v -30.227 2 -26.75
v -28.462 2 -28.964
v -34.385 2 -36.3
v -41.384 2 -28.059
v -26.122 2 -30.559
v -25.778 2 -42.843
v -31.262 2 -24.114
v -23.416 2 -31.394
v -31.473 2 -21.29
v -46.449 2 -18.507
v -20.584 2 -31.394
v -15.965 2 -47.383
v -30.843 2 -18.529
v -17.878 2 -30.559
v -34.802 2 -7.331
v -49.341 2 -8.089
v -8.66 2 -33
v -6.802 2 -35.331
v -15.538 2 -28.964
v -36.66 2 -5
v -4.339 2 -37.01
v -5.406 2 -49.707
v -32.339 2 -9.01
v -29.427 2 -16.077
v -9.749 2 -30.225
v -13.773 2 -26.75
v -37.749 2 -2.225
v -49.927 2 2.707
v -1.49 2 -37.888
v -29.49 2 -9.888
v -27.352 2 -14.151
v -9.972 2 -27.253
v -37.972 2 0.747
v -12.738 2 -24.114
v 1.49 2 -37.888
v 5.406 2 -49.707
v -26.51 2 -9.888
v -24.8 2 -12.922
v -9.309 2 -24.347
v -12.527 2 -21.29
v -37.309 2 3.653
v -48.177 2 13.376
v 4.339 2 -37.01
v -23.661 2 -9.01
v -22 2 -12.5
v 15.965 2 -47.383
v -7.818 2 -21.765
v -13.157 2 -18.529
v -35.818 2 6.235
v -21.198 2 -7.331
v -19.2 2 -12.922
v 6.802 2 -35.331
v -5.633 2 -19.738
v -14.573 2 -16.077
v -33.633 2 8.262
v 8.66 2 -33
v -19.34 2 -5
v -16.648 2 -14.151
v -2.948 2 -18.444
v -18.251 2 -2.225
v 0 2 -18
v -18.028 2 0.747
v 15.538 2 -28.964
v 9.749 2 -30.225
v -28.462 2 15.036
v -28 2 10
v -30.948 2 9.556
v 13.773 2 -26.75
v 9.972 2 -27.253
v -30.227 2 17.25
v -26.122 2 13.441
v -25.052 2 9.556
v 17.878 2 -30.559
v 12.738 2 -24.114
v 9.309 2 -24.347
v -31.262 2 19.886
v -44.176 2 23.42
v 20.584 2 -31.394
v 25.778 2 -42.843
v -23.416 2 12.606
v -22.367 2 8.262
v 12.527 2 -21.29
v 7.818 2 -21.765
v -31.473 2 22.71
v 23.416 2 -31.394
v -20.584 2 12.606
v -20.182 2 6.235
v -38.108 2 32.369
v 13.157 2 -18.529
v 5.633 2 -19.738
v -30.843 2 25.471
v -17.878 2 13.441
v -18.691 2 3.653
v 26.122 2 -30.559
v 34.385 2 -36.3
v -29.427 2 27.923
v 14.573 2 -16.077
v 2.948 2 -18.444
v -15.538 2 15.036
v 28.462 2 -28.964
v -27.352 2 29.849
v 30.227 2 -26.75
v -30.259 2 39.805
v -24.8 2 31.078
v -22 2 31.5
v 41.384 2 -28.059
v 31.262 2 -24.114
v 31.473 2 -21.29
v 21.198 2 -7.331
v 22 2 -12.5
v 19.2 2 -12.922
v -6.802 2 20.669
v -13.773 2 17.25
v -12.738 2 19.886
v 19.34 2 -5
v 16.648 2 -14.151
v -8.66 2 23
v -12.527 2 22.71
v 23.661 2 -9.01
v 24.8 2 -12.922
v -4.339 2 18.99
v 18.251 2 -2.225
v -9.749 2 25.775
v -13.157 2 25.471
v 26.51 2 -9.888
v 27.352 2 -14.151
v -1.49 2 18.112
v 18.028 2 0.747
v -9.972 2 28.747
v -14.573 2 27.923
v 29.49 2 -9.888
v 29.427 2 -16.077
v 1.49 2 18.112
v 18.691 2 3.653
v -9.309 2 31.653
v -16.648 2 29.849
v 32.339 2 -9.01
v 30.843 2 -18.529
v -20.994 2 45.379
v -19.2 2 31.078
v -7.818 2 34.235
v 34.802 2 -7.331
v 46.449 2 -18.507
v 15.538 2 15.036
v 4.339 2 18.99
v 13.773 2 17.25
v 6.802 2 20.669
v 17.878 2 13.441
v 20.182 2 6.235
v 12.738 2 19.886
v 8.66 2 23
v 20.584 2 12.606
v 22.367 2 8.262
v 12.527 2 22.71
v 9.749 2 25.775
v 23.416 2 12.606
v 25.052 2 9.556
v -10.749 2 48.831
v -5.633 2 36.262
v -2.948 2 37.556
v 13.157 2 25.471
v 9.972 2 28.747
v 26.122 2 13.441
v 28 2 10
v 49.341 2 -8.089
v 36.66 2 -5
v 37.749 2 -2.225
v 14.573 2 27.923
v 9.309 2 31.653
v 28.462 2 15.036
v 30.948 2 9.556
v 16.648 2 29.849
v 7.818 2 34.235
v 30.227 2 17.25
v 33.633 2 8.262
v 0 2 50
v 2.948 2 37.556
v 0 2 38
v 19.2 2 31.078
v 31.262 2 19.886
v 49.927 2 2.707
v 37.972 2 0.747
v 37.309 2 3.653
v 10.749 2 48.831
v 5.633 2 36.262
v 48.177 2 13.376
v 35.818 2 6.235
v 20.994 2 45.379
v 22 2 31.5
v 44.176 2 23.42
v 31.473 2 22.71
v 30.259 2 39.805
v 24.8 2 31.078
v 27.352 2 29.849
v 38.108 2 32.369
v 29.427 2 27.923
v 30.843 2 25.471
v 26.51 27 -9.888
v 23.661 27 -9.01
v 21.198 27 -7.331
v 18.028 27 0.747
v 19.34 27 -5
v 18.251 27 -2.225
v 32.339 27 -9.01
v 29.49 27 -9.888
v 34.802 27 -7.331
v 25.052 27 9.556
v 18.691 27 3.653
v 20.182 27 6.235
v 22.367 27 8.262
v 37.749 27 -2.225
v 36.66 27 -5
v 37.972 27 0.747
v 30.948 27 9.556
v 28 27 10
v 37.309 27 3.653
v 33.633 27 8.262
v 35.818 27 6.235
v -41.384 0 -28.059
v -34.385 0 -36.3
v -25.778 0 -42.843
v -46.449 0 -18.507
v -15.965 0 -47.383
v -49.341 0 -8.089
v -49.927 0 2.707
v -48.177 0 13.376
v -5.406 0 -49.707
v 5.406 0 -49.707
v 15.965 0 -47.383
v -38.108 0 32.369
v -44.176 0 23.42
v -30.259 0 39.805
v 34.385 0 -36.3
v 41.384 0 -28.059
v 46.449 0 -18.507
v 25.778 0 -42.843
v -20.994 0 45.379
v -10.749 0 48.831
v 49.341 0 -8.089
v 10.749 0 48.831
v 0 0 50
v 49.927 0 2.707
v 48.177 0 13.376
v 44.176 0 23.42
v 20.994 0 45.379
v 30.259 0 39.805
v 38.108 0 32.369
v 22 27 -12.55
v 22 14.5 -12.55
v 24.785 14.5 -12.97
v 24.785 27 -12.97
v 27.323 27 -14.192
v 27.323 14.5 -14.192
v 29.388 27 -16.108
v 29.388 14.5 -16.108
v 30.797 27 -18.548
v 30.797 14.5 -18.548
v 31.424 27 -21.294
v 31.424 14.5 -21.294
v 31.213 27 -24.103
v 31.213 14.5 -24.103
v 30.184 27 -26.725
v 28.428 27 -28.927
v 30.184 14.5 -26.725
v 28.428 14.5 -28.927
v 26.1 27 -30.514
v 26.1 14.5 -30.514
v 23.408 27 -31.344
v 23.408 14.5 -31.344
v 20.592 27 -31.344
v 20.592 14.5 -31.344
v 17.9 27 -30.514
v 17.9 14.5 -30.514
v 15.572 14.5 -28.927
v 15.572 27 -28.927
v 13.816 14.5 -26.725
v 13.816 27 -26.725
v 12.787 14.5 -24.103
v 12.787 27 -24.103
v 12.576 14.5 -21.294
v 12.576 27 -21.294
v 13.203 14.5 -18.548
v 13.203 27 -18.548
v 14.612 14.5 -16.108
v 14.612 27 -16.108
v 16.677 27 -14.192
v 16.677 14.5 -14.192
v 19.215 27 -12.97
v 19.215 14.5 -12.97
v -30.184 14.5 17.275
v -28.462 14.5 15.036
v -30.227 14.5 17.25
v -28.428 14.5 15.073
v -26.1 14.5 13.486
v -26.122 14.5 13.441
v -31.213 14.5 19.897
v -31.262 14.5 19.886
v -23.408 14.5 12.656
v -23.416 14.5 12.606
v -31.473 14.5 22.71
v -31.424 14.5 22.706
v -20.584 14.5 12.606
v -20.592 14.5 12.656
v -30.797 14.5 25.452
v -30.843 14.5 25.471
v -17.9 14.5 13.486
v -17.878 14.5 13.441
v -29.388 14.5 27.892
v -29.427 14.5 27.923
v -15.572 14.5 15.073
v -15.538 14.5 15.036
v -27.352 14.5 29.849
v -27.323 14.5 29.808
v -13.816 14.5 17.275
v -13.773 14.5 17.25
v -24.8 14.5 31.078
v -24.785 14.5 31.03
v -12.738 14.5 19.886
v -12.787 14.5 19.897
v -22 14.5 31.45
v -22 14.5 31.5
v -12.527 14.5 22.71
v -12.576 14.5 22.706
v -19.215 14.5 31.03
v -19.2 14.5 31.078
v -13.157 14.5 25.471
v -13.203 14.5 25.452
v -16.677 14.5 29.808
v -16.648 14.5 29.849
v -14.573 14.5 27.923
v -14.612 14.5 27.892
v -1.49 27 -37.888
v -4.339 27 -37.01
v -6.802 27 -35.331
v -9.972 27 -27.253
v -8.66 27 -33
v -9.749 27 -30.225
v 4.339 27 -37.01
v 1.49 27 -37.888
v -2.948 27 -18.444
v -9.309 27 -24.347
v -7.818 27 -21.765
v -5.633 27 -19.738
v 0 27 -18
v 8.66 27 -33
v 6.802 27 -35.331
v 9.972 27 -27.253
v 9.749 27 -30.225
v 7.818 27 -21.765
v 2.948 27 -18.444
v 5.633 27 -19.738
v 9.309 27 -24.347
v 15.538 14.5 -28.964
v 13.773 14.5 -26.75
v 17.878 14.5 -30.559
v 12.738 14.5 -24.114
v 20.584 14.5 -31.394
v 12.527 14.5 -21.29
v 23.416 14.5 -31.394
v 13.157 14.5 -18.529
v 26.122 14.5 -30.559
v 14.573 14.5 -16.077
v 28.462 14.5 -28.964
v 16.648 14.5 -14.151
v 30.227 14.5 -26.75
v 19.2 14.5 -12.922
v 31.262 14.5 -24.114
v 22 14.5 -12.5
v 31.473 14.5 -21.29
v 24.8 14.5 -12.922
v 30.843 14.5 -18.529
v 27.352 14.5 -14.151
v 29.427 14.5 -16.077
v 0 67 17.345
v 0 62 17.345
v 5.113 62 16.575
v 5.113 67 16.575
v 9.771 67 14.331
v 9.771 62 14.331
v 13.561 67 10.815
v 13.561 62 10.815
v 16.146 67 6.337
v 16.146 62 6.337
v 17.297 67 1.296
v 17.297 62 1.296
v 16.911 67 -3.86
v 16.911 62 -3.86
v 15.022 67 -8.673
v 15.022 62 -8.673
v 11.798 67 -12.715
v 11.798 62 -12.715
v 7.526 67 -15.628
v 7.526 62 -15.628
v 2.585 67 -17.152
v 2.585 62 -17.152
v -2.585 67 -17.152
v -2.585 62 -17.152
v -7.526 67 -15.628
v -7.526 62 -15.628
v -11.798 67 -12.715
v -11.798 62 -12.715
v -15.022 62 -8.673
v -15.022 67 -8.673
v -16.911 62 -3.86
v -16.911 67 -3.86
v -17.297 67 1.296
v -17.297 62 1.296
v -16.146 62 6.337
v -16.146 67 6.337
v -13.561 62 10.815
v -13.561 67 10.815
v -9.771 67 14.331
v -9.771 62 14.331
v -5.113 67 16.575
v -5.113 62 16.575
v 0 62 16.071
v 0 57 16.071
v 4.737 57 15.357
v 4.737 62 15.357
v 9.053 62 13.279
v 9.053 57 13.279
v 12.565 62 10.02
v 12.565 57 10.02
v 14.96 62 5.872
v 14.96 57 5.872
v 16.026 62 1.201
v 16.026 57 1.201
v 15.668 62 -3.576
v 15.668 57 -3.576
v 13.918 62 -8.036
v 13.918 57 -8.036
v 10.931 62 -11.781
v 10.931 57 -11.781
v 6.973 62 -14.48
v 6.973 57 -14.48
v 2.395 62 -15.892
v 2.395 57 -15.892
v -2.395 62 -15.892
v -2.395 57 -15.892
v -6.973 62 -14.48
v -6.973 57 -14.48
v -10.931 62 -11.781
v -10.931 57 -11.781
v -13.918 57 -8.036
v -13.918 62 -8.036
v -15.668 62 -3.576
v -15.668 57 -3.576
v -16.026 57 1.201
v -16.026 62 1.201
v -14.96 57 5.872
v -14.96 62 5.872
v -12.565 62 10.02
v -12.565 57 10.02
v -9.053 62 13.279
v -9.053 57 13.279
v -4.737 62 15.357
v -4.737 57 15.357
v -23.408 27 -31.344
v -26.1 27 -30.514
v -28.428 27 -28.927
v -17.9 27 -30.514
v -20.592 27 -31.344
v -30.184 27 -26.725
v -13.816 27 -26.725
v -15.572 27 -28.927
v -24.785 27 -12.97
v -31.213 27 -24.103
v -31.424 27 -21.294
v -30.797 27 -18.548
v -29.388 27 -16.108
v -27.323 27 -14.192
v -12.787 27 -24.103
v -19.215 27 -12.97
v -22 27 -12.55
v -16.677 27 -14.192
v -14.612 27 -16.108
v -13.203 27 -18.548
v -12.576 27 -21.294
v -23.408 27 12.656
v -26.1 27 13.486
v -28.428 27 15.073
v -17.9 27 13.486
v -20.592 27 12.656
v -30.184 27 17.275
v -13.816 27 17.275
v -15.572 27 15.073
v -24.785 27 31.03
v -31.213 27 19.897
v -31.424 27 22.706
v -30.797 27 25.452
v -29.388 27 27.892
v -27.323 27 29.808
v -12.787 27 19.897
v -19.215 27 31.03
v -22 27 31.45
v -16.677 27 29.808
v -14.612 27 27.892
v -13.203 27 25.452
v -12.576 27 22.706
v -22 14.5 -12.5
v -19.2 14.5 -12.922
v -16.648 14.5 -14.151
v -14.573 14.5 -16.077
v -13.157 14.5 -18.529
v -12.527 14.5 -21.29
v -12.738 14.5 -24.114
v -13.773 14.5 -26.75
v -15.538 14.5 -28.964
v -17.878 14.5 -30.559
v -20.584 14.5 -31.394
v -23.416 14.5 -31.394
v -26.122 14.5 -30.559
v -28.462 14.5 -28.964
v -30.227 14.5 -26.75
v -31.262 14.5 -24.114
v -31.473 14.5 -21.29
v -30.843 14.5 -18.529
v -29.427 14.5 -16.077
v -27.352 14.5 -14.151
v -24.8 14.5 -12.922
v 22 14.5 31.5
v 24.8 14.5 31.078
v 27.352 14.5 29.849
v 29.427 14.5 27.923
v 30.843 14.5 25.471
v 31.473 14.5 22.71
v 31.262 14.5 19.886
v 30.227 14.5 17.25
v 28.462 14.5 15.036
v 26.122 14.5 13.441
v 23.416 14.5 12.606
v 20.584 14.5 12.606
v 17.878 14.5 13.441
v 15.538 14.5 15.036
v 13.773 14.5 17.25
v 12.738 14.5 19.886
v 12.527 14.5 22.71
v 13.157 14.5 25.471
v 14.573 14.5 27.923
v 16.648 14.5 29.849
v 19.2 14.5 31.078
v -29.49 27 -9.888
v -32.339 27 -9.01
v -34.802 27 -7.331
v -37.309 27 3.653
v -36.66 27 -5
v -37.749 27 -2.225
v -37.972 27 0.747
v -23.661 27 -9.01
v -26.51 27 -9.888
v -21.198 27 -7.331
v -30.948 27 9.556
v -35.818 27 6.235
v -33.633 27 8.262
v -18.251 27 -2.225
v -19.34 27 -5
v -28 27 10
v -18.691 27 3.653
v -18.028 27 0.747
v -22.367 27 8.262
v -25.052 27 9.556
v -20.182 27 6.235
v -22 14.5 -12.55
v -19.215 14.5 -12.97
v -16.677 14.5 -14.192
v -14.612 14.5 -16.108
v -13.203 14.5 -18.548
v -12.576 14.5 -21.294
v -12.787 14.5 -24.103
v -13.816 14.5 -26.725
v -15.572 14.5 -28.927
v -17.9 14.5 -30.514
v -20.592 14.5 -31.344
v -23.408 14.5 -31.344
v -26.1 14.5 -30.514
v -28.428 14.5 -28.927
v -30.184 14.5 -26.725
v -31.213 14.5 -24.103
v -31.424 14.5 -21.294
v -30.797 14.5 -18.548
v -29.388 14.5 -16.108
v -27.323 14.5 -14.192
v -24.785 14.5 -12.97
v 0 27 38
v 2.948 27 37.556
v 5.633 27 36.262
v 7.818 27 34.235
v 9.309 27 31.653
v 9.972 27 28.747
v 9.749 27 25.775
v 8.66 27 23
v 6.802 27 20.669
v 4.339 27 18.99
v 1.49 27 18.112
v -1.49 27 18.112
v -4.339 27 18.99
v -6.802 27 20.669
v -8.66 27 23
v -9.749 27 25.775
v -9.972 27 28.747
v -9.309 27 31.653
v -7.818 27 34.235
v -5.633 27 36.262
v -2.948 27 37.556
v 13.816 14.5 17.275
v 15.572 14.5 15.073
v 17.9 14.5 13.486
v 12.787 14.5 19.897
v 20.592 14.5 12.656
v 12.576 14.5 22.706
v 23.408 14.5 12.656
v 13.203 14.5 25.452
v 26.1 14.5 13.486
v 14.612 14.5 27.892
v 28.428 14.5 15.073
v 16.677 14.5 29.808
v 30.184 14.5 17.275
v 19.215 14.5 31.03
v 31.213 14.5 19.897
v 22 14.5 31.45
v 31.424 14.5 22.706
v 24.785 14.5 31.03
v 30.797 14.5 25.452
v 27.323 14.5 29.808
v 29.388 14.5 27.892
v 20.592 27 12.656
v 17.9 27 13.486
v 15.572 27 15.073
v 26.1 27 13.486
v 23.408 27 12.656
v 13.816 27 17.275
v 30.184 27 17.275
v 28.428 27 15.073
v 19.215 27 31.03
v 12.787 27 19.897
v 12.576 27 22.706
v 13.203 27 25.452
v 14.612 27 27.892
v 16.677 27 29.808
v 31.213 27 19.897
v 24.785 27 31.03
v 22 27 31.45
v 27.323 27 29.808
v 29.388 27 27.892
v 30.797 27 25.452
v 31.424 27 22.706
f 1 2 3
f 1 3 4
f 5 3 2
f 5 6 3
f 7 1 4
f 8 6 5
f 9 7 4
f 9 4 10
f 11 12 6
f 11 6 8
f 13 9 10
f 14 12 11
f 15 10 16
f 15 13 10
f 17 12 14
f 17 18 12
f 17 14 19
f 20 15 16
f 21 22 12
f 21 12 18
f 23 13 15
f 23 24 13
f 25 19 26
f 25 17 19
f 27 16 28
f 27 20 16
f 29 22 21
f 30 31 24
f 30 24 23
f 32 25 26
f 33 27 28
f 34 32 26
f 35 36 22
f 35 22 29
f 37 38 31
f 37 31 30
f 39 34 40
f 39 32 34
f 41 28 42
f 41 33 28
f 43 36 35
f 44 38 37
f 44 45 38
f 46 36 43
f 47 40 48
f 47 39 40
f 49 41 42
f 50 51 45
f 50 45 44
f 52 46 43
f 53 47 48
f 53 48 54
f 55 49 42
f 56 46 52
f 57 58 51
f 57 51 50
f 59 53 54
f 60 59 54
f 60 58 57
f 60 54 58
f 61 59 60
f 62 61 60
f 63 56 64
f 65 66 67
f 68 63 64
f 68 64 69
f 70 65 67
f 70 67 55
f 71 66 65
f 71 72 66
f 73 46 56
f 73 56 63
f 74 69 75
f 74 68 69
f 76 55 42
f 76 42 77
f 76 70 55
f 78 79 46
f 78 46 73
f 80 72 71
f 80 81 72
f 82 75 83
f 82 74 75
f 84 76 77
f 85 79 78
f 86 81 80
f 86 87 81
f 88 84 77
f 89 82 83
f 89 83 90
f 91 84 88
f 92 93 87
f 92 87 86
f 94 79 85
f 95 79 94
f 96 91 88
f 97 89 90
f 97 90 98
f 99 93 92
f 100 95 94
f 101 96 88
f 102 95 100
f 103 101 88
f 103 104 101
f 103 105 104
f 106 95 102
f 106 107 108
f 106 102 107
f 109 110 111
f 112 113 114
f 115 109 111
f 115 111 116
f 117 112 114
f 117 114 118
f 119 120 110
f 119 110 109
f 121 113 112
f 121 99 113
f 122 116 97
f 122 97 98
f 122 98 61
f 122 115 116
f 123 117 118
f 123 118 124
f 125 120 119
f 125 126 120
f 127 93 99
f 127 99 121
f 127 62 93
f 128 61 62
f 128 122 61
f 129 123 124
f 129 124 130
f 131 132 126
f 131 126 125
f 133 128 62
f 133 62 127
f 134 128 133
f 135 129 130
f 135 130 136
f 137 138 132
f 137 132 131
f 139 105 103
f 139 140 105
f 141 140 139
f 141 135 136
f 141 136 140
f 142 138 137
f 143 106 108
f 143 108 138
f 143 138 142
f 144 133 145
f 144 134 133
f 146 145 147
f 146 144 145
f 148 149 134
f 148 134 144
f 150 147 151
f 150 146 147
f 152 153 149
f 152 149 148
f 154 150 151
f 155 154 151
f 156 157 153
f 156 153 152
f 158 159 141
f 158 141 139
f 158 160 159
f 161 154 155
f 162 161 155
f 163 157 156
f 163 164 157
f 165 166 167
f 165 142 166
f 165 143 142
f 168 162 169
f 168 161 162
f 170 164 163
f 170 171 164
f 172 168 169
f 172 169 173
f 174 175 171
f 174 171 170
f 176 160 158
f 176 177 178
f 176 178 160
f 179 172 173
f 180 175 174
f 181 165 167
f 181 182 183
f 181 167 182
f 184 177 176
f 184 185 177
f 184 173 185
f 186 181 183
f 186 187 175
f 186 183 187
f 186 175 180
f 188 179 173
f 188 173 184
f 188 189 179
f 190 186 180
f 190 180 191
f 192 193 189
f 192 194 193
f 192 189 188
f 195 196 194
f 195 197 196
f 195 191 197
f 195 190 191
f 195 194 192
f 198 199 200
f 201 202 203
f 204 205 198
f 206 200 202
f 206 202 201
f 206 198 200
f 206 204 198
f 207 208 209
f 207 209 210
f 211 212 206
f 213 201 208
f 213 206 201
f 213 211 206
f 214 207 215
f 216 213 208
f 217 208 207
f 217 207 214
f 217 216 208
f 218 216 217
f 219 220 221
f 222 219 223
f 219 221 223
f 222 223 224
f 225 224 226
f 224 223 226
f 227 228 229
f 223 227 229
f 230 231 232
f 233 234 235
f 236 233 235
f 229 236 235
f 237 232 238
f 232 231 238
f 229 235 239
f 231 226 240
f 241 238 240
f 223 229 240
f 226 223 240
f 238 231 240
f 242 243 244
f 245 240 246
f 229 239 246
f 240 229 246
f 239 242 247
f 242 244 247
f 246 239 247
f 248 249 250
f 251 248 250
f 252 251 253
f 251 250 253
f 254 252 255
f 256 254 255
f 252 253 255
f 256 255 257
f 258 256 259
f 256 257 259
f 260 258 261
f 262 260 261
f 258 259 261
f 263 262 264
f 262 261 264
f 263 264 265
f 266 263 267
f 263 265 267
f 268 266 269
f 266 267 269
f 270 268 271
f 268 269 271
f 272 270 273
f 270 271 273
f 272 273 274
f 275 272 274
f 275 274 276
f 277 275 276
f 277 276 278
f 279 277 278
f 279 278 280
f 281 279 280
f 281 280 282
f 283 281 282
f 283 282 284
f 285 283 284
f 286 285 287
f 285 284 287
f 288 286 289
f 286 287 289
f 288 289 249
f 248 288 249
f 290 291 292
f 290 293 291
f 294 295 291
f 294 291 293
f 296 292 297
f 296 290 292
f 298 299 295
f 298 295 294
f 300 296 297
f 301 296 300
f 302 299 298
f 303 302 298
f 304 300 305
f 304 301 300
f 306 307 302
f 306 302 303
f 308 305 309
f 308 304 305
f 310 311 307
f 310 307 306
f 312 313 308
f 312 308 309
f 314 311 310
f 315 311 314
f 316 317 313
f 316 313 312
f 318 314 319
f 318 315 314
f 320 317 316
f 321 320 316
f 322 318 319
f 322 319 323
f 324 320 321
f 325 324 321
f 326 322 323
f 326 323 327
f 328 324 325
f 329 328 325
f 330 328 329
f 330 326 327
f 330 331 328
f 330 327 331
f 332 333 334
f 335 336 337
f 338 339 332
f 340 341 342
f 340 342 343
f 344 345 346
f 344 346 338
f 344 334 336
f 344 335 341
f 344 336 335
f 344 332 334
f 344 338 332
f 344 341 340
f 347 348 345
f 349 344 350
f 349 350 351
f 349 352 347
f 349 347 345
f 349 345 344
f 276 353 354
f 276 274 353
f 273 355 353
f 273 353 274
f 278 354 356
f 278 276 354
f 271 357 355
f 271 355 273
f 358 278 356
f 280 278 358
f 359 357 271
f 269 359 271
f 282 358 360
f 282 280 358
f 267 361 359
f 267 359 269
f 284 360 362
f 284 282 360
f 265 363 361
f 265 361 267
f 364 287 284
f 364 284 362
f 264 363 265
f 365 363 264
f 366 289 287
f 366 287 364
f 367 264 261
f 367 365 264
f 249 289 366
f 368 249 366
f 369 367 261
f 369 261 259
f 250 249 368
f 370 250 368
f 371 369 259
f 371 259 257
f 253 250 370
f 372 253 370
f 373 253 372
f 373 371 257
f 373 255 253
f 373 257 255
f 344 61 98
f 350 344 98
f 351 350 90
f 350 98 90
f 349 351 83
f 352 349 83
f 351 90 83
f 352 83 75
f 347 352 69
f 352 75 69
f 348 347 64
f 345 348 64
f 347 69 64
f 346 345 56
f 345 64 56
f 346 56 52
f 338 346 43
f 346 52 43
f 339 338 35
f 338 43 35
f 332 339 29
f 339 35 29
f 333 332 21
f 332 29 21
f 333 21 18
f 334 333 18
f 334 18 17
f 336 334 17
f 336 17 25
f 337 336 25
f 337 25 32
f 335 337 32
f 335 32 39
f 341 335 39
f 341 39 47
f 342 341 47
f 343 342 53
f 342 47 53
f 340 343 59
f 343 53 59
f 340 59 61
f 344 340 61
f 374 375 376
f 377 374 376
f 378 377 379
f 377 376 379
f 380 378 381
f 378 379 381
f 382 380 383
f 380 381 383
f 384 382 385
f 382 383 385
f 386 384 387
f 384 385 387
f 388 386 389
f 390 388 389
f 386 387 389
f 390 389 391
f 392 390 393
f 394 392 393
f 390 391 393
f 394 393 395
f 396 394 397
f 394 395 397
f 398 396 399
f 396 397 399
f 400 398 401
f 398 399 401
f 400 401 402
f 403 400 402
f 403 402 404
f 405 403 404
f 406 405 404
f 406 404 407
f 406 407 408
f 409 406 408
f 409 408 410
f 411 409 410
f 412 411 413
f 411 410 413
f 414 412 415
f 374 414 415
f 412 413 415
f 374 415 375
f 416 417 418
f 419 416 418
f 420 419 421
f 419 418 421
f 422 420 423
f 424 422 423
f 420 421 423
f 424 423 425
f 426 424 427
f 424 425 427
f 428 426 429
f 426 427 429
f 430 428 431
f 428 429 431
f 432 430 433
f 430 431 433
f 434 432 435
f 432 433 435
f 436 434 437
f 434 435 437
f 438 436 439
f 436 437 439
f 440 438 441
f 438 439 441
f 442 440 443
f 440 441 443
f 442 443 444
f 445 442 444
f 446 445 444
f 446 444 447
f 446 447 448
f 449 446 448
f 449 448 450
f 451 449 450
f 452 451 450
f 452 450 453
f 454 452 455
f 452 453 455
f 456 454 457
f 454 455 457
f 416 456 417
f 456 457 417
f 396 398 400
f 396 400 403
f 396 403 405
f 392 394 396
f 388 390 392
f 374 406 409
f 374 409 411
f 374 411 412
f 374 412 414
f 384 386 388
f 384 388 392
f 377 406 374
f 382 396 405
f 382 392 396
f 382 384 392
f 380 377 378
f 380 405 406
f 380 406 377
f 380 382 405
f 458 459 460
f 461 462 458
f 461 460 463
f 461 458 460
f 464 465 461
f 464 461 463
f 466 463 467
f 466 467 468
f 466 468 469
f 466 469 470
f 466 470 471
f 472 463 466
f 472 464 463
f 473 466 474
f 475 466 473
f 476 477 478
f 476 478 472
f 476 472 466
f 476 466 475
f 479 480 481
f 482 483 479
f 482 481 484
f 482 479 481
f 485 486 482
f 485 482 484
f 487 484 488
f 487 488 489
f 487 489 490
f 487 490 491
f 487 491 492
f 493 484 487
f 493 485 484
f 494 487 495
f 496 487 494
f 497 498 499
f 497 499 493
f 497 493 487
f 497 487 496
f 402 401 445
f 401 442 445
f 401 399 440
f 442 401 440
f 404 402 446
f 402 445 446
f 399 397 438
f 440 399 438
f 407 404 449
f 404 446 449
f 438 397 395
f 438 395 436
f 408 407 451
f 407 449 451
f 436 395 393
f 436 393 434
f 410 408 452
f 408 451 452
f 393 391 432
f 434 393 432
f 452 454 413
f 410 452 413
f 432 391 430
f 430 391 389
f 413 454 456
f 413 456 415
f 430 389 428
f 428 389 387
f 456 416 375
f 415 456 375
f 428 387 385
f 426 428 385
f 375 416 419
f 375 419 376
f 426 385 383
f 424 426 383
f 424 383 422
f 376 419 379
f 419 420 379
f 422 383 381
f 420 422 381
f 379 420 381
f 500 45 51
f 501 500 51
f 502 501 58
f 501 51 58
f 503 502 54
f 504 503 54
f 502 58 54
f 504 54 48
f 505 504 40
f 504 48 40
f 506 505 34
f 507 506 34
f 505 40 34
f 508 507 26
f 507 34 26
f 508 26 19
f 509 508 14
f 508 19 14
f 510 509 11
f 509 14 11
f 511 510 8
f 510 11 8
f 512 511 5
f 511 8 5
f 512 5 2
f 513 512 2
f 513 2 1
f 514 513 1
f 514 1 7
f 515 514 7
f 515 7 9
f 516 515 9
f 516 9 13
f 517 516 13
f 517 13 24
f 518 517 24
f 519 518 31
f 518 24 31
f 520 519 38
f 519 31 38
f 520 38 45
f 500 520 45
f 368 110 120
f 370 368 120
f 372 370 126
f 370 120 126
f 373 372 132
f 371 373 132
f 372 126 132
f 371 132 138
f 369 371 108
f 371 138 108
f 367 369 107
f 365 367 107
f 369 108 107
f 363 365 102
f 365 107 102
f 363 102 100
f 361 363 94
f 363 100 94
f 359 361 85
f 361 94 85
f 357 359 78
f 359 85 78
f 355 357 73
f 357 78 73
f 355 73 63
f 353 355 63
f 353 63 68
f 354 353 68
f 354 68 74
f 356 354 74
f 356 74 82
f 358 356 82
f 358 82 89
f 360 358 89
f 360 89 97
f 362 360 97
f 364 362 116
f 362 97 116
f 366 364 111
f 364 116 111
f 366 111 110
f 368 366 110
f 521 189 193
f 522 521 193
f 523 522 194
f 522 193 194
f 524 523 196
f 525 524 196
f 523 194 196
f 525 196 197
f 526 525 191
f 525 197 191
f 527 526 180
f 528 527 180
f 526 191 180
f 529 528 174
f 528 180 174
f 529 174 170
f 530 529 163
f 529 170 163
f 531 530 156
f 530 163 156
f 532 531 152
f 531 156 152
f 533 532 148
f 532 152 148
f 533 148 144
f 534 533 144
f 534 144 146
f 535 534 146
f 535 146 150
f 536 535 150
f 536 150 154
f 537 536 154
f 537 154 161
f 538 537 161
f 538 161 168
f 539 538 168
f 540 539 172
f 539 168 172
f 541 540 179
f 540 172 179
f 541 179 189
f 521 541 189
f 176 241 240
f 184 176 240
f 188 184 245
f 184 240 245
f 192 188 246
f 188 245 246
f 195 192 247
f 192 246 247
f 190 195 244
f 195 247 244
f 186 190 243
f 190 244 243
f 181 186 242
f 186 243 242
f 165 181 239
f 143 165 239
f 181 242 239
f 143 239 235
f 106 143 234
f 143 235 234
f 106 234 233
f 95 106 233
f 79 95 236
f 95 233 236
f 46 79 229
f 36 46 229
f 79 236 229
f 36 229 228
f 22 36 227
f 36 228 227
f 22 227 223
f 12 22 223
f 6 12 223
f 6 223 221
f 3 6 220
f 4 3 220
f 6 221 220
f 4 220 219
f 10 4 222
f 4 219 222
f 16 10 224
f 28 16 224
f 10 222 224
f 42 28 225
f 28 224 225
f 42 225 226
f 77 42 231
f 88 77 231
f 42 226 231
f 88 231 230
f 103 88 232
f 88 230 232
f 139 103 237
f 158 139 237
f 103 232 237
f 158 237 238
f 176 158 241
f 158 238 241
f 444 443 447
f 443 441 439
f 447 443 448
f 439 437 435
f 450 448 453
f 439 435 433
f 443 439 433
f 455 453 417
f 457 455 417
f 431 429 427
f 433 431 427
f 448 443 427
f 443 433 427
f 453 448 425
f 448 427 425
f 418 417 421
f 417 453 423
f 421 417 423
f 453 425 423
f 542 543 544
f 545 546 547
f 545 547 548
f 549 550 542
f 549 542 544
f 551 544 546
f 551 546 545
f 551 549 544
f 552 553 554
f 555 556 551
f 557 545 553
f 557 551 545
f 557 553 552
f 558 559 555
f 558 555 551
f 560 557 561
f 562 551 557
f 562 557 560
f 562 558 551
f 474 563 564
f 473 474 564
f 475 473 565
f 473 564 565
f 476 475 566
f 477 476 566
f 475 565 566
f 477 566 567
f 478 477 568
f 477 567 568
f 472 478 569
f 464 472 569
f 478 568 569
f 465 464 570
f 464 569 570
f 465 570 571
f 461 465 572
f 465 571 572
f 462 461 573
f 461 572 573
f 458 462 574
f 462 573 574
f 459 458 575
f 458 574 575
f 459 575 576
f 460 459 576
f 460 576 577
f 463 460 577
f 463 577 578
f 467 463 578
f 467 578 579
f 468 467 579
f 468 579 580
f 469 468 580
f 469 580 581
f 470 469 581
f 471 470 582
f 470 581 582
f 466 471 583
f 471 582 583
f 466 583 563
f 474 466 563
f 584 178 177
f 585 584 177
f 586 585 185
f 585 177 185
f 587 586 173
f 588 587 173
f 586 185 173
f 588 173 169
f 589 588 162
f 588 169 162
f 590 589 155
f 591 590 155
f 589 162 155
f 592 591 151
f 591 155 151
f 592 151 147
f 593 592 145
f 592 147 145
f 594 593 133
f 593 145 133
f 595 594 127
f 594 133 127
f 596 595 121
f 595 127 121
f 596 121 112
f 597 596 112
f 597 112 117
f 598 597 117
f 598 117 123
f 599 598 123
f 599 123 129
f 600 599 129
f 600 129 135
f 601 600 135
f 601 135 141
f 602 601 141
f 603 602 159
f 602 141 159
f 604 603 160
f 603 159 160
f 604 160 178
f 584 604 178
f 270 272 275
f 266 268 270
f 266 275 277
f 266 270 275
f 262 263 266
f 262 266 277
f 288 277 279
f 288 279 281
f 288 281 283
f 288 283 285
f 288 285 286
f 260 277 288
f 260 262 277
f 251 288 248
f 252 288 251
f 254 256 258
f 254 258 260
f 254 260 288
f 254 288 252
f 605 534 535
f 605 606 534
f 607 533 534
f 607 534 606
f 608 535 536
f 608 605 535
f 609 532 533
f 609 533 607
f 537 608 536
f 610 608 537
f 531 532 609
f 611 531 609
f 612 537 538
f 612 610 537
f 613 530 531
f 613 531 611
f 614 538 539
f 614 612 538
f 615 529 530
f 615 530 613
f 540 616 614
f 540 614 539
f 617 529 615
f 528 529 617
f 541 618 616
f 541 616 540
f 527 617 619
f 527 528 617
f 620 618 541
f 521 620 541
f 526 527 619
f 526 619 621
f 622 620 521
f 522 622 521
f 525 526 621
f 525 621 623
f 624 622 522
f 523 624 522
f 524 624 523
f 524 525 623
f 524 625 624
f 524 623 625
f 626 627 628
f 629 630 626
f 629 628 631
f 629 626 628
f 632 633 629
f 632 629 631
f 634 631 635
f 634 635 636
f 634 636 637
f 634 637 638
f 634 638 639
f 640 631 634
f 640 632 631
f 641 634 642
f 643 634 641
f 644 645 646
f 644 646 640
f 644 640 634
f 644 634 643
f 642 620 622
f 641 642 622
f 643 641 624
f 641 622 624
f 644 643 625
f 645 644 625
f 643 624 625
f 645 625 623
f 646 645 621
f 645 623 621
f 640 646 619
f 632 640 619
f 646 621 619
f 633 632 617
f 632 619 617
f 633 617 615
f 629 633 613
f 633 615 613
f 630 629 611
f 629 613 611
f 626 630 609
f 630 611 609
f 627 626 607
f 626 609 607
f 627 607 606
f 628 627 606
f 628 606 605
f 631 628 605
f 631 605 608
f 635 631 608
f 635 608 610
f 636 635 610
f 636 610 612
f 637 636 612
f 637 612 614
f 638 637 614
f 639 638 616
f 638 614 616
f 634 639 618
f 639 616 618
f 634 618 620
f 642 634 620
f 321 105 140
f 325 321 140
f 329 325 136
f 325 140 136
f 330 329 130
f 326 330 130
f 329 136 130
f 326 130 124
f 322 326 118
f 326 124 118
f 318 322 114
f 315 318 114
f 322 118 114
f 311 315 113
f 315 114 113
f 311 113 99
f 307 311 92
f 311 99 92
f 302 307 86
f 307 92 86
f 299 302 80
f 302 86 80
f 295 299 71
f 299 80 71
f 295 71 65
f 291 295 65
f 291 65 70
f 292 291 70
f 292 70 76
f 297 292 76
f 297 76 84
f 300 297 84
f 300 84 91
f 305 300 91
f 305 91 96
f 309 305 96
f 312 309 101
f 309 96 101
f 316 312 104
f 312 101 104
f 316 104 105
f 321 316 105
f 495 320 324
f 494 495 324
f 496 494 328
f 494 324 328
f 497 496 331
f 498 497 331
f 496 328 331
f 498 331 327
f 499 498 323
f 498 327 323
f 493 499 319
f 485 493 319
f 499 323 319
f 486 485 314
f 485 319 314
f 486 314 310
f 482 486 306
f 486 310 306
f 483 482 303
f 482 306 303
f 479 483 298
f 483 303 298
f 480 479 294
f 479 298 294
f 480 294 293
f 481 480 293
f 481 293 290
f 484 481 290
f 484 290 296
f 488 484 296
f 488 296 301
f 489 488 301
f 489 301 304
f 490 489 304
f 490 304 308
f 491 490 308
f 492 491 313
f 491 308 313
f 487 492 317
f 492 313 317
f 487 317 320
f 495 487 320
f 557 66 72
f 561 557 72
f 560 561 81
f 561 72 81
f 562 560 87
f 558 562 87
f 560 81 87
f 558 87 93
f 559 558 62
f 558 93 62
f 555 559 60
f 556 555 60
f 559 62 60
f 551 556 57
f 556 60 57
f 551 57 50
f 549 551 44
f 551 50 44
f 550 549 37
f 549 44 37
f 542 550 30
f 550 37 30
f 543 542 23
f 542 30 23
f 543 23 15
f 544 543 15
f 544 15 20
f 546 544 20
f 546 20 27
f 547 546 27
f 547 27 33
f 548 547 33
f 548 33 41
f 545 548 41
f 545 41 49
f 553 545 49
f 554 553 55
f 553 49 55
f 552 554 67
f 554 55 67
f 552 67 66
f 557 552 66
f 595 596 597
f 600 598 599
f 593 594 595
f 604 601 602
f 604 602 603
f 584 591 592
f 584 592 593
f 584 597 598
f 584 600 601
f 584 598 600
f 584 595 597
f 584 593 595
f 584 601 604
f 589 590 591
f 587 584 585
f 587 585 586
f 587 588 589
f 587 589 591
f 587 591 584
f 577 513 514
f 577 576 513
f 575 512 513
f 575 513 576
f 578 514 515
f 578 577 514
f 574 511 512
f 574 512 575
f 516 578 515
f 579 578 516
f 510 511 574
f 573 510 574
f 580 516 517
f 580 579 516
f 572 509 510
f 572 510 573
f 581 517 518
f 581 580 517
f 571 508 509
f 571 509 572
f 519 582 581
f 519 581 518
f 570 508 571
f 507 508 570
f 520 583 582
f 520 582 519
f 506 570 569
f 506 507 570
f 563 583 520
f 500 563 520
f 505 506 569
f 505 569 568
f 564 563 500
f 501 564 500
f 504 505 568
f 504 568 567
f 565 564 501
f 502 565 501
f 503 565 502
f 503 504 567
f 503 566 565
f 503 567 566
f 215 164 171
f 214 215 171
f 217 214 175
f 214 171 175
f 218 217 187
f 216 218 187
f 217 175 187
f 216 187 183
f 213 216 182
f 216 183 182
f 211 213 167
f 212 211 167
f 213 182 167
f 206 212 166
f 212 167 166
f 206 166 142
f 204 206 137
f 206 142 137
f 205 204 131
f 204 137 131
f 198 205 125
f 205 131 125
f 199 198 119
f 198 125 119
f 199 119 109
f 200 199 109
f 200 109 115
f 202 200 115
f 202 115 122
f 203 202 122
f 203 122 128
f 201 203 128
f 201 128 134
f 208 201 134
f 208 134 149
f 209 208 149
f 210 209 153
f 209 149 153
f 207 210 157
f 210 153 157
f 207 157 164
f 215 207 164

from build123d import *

# Parameters (mm, degrees)
SKETCH1_R           = 50
BOSS_EXTRUDE1_DEPTH = 2
SKETCH2_R           = 10
BOSS_EXTRUDE2_DEPTH = 25
SKETCH2_3_R         = 9.5
BOSS_EXTRUDE3_DEPTH = 12.5
SKETCH5_R           = 9.45
BOSS_EXTRUDE4_DEPTH = 12.5
SKETCH6_R           = 16.071329463
BOSS_EXTRUDE5_DEPTH = 5
SKETCH7_R           = 17.345412176
BOSS_EXTRUDE6_DEPTH = 5


with BuildPart() as part:
    # Sketch1 → Boss-Extrude1 (new body)
    with BuildSketch(Plane(origin=(0, 0, 0), x_dir=(1, 0, 0), z_dir=(0, 1, 0))):
        Circle(SKETCH1_R)
    extrude(amount=BOSS_EXTRUDE1_DEPTH)

    # Sketch2 → Boss-Extrude2 (add)
    with BuildSketch(Plane(origin=(0, 2, 0), x_dir=(1, 0, 0), z_dir=(0, 1, 0))):
        with Locations((28, 0)):
            Circle(SKETCH2_R)
        with Locations((0, 28)):
            Circle(SKETCH2_R)
        with Locations((-28, 0)):
            Circle(SKETCH2_R)
        with Locations((0, -28)):
            Circle(SKETCH2_R)
    extrude(amount=BOSS_EXTRUDE2_DEPTH)

    # Sketch2<3> → Boss-Extrude3 (add)
    with BuildSketch(Plane(origin=(0, 2, 0), x_dir=(1, 0, 0), z_dir=(0, 1, 0))):
        with Locations((22, -22)):
            Circle(SKETCH2_3_R)
        with Locations((-22, -22)):
            Circle(SKETCH2_3_R)
        with Locations((22, 22)):
            Circle(SKETCH2_3_R)
        with Locations((-22, 22)):
            Circle(SKETCH2_3_R)
    extrude(amount=BOSS_EXTRUDE3_DEPTH)

    # Sketch5 → Boss-Extrude4 (add)
    with BuildSketch(Plane(origin=(0, 14.5, 0), x_dir=(1, 0, 0), z_dir=(0, 1, 0))):
        with Locations((-22, -22)):
            Circle(SKETCH5_R)
        with Locations((22, 22)):
            Circle(SKETCH5_R)
        with Locations((22, -22)):
            Circle(SKETCH5_R)
        with Locations((-22, 22)):
            Circle(SKETCH5_R)
    extrude(amount=BOSS_EXTRUDE4_DEPTH)


with BuildPart() as body_2:
    # Sketch6 → Boss-Extrude5 (new body)
    with BuildSketch(Plane(origin=(0, 57, 0), x_dir=(1, 0, 0), z_dir=(0, 1, 0))):
        Circle(SKETCH6_R)
    extrude(amount=BOSS_EXTRUDE5_DEPTH)

    # Sketch7 → Boss-Extrude6 (add)
    with BuildSketch(Plane(origin=(0, 62, 0), x_dir=(1, 0, 0), z_dir=(0, 1, 0))):
        Circle(SKETCH7_R)
    extrude(amount=BOSS_EXTRUDE6_DEPTH)


solid = Compound([part.part, body_2.part])
